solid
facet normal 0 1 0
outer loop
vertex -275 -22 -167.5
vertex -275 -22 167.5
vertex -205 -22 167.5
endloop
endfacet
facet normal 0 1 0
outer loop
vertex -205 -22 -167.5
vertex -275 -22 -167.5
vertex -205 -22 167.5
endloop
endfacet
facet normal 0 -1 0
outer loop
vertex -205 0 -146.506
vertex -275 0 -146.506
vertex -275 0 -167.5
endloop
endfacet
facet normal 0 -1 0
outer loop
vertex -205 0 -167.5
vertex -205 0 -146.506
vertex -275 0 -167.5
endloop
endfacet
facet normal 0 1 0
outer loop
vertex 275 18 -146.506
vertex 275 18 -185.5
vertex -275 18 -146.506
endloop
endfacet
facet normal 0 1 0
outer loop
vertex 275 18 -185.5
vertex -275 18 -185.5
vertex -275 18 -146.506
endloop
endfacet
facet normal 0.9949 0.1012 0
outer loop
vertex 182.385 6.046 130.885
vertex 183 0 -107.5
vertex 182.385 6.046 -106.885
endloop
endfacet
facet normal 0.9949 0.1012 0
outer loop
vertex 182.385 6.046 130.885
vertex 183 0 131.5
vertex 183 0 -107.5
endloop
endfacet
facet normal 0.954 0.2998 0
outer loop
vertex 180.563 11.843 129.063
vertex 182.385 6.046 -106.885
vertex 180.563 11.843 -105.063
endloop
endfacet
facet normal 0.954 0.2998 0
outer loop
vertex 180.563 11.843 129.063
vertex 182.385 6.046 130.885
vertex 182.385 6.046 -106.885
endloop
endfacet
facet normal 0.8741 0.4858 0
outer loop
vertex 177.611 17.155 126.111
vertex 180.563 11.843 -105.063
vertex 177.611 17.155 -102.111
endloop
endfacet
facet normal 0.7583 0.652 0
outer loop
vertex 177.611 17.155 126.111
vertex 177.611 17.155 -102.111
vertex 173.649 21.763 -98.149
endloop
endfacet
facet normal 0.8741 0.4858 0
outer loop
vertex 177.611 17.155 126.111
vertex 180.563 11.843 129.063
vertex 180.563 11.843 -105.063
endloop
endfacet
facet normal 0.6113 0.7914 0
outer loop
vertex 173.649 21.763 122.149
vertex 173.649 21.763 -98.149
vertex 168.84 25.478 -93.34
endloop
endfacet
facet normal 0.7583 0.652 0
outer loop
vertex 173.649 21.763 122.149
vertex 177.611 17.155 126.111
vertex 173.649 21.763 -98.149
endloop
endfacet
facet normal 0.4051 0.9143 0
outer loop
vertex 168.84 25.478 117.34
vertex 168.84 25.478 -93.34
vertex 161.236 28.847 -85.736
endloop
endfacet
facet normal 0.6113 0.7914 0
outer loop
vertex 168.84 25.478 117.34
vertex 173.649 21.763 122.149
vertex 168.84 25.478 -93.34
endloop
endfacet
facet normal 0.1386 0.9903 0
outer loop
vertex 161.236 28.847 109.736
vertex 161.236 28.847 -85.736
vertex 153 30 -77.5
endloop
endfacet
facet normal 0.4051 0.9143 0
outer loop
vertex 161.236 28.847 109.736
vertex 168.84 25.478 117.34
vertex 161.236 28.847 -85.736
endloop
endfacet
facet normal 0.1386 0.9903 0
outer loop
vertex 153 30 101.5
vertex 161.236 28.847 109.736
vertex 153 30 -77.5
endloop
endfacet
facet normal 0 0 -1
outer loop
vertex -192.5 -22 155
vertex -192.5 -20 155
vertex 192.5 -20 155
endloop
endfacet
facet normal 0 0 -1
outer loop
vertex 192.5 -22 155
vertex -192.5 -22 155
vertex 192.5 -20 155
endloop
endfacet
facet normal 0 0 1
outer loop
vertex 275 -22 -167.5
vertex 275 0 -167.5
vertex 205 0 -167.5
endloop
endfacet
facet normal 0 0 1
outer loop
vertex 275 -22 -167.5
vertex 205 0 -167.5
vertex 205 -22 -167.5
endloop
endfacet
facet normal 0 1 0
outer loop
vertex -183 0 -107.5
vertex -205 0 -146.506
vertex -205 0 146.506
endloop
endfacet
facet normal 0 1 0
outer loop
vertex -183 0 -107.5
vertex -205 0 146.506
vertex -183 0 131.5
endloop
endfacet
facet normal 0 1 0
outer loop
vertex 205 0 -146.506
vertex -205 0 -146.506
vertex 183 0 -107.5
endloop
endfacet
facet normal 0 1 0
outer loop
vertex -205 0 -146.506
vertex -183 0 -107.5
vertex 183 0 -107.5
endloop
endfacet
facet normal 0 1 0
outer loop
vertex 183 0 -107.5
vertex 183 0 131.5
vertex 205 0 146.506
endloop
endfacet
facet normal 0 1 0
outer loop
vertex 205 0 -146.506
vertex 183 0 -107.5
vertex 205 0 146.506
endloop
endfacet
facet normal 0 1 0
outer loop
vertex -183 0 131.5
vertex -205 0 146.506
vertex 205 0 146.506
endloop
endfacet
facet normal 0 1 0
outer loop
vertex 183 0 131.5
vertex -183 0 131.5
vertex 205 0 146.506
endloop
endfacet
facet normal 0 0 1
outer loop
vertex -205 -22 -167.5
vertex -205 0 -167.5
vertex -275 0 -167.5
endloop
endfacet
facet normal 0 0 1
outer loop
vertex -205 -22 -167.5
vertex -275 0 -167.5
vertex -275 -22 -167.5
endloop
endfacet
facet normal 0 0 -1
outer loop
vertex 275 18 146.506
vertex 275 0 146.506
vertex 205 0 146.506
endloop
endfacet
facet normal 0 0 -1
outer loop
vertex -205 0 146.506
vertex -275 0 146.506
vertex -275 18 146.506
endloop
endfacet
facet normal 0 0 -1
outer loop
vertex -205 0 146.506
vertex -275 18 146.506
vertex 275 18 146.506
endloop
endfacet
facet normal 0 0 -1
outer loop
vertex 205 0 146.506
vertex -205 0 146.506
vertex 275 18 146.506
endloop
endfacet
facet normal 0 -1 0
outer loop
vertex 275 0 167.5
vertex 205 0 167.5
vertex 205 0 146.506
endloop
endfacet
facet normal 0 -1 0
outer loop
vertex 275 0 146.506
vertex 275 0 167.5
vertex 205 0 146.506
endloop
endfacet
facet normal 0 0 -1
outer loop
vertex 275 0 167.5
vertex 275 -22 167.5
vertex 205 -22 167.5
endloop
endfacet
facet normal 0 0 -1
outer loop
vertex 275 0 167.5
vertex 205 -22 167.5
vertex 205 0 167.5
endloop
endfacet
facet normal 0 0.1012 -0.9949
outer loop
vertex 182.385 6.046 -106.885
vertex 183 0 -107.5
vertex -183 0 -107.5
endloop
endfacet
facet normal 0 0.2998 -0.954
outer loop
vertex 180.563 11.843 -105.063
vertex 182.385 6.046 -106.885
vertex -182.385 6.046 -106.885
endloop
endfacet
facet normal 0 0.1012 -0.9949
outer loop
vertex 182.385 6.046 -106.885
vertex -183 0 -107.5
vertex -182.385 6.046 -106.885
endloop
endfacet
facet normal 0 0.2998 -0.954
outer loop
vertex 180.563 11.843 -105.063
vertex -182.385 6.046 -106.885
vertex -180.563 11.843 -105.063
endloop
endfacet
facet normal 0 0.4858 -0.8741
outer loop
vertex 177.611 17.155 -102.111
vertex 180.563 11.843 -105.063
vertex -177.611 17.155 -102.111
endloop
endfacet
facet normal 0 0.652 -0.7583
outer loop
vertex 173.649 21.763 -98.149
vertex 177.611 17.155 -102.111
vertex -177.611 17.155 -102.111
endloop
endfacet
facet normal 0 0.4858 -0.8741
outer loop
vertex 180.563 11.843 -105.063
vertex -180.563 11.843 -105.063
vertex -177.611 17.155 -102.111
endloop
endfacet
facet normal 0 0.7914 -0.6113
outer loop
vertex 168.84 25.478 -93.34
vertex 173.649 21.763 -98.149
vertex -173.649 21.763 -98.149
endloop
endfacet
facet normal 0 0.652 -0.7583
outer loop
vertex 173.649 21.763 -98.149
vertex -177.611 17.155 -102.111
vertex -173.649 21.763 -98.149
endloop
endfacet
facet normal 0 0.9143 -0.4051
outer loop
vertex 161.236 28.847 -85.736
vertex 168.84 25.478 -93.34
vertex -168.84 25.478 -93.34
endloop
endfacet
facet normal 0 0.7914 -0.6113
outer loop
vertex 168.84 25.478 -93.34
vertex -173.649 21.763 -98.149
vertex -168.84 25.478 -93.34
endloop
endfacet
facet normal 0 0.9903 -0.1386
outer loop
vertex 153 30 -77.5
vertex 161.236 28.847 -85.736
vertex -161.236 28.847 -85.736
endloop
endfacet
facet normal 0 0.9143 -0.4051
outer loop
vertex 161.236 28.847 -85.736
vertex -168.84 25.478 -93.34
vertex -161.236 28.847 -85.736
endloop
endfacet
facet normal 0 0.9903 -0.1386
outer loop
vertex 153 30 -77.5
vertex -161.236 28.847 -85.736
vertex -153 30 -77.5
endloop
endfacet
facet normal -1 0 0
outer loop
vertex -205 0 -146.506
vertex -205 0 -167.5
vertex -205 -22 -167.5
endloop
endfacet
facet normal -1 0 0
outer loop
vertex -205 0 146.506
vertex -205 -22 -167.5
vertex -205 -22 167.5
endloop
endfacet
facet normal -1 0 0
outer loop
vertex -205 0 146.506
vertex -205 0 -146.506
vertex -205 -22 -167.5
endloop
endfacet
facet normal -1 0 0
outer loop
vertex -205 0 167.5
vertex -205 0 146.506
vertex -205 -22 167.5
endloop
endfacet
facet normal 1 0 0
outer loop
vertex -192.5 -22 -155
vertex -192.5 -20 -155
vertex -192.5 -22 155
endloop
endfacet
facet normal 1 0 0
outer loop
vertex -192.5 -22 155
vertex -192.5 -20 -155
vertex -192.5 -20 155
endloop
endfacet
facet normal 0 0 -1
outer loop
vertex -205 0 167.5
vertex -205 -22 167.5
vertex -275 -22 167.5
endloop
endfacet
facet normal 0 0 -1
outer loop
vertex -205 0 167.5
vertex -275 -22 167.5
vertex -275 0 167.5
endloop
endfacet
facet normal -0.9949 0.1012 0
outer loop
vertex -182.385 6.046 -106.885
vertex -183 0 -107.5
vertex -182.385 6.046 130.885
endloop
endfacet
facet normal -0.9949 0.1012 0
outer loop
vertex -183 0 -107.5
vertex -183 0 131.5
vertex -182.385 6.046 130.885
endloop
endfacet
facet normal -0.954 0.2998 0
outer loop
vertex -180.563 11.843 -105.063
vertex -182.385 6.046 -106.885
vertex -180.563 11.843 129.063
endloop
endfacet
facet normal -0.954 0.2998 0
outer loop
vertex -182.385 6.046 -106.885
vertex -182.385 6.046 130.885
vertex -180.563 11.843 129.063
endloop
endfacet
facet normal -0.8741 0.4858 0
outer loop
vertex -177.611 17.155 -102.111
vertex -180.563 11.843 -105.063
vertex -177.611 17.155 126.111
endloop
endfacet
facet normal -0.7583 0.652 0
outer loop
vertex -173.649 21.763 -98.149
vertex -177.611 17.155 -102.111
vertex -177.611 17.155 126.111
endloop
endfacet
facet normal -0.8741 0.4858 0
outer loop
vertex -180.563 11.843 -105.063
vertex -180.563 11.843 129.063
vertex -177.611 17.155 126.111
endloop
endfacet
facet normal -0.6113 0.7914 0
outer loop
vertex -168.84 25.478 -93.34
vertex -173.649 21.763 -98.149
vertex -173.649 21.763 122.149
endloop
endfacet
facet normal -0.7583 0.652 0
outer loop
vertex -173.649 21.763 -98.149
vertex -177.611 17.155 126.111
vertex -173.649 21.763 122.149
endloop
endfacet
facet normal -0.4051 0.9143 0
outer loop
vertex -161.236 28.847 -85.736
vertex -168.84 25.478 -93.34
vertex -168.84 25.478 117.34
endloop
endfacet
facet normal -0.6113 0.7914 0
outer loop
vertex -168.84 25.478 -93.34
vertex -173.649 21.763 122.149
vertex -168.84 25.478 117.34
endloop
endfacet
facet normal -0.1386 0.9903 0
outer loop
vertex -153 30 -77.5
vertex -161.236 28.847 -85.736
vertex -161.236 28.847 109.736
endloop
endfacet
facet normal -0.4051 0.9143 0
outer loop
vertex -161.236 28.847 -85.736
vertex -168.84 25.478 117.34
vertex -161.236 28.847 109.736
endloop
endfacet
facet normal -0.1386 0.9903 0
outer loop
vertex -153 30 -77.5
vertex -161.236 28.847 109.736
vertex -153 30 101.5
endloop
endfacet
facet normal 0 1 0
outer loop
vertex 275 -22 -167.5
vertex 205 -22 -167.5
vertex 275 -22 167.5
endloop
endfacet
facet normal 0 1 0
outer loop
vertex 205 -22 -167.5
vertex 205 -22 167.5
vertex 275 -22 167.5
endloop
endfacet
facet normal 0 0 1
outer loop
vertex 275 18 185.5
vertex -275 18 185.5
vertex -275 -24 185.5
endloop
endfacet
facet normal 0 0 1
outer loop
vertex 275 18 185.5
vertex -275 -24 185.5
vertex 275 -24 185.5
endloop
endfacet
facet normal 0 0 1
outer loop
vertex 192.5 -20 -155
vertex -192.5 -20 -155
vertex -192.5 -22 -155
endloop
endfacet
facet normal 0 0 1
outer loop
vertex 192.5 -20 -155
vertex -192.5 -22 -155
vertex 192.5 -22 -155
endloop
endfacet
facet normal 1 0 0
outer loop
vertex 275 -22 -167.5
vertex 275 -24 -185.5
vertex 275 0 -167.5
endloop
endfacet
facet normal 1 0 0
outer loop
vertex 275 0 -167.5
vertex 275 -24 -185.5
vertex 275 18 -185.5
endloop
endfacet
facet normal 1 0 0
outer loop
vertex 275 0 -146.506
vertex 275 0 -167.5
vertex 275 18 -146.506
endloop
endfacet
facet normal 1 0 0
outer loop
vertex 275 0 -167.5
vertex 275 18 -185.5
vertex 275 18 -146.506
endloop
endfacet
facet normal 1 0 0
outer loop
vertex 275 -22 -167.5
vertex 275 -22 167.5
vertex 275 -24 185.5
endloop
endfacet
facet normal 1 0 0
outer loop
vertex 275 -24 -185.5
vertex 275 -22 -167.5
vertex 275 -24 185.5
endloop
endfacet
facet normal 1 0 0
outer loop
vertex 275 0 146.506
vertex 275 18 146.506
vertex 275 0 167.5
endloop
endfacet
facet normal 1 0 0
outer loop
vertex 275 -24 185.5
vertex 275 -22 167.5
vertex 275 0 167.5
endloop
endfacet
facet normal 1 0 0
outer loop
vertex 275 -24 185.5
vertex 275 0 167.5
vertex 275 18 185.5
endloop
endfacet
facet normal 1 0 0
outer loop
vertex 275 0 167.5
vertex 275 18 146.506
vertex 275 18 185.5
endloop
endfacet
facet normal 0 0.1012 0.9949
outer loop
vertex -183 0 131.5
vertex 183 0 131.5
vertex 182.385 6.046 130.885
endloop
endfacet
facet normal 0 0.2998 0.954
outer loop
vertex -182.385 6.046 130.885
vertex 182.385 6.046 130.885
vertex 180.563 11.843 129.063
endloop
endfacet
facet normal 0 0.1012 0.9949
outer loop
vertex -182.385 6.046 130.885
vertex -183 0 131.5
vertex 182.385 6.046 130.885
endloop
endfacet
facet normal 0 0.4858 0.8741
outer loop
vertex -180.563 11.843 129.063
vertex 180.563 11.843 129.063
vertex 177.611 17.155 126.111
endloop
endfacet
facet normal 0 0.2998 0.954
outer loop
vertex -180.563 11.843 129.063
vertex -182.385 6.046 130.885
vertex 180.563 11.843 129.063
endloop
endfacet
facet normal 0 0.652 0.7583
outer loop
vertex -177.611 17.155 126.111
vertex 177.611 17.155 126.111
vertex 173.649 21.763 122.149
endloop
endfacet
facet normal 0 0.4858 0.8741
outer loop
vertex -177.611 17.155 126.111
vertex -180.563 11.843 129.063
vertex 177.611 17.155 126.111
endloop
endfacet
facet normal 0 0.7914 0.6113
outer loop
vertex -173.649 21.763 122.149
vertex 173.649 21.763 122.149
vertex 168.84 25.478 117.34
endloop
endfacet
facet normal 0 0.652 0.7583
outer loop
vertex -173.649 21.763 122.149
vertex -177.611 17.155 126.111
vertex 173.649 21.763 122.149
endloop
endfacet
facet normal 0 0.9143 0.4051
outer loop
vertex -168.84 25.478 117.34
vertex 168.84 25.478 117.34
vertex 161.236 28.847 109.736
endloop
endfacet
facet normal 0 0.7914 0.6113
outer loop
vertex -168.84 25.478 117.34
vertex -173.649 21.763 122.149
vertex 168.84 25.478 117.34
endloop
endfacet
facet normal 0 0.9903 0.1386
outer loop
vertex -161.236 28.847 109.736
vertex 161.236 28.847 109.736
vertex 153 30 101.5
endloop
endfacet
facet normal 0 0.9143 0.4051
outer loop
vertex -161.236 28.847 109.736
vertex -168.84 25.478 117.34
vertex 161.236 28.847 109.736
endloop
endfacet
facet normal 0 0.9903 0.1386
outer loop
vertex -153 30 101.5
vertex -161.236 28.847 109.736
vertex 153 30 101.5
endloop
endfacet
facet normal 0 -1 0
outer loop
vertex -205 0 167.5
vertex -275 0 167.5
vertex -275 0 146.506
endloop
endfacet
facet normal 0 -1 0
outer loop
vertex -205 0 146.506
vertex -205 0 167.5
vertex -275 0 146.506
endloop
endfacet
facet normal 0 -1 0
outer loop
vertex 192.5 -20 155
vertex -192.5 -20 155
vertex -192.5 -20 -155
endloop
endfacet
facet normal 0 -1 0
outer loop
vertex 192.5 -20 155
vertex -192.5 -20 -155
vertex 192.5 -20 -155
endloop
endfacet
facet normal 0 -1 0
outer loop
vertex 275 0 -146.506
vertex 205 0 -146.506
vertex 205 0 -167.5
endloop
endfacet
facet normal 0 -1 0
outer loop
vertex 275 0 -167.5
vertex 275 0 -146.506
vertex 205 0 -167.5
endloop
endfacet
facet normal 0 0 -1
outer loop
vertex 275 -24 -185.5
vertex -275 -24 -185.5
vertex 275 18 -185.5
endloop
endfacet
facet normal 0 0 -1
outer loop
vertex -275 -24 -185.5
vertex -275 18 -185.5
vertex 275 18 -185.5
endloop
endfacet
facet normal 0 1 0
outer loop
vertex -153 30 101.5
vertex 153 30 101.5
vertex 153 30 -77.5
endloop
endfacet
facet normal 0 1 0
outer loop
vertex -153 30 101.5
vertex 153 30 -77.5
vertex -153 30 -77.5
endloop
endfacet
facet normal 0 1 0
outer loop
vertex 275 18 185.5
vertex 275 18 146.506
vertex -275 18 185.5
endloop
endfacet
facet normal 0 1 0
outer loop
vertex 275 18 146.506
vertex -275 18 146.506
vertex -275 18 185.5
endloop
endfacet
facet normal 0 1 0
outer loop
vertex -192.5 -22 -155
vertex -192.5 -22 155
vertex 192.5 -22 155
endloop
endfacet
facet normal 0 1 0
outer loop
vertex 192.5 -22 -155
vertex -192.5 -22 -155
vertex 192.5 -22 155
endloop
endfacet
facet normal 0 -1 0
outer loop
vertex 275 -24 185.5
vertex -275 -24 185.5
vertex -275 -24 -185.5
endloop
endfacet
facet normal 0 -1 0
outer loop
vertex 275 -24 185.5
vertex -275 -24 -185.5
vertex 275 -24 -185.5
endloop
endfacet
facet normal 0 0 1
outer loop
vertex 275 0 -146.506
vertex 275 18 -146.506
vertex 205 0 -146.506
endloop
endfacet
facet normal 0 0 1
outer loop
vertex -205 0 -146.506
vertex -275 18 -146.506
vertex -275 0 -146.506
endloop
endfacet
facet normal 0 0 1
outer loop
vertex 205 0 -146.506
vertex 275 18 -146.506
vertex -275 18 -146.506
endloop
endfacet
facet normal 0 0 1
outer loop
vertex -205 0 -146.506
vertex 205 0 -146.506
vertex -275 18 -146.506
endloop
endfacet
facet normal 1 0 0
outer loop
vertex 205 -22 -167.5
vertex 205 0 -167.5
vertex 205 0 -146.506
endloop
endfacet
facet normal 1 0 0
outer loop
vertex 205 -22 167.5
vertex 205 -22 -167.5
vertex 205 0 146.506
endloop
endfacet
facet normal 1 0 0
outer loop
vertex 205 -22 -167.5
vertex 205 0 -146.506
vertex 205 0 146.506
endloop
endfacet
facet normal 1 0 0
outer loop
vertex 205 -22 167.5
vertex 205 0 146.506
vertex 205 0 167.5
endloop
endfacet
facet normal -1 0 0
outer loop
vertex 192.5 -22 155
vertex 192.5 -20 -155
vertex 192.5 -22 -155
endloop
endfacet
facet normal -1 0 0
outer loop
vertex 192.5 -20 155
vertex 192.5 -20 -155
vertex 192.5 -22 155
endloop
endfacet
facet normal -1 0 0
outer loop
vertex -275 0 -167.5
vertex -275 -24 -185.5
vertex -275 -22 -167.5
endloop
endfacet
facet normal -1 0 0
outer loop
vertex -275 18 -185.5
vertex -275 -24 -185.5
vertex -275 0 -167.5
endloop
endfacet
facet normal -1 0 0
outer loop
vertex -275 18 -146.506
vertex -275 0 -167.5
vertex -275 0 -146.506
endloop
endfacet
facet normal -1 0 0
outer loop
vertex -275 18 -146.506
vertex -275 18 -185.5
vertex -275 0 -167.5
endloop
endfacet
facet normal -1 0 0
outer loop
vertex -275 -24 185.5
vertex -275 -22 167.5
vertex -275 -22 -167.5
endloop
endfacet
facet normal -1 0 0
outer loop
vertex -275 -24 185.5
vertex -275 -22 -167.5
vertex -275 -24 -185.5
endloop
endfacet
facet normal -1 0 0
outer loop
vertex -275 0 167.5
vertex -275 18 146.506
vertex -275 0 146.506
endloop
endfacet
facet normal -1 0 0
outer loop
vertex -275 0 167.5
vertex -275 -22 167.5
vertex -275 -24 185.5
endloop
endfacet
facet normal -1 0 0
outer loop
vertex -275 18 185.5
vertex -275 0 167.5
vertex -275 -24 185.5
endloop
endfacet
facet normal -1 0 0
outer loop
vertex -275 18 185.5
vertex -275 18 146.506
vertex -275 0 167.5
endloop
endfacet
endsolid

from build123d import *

# Parameters (mm, degrees)
F0_W          = 410
F0_H          = 335
F0_W_2        = 385
F0_H_2        = 310
F1_DEPTH      = 22
F2_DEPTH      = 20
F4_DEPTH      = 480
F4_DEPTH_BACK = 70
F5_W          = 366
F5_H          = 239
F6_DEPTH      = 30
F7_R          = 29.99999
F9_W          = 550
F9_H          = 371
F10_DEPTH     = 2


# Not quite as in the source:
# - a fillet or chamfer is up to 0.001 mm smaller than in the source, because OpenCascade refuses the exact size


with BuildPart() as f1:
    # F0 (on Front) → F1 (new body)
    with BuildSketch(Plane.XZ):
        Rectangle(F0_W, F0_H)
        Rectangle(F0_W_2, F0_H_2, mode=Mode.SUBTRACT)
    extrude(amount=F1_DEPTH)

    # F0 (on Front) → F2 (join)
    with BuildSketch(Plane.XZ):
        Rectangle(F0_W_2, F0_H_2)
    extrude(amount=F2_DEPTH)

    # F5 (on face) → F6 (join)
    with BuildSketch(Plane(origin=(0, 0, 0), x_dir=(-1, 0, 0), z_dir=(0, 1, 0))):
        with Locations((0, 12)):
            Rectangle(F5_W, F5_H)
    extrude(amount=F6_DEPTH)

    # F7 (radius 30 in the source; OpenCascade refuses exactly that, so slightly less here)
    f7_edges = [f1.edges().sort_by_distance(p)[0] for p in [
        (-183, 30, 12),
        (0, 30, 131.5),
        (183, 30, 12),
        (0, 30, -107.5),
    ]]
    fillet(f7_edges, radius=F7_R)


with BuildPart() as f4:
    # F3 (on face) → F4 (new body, two sides)
    with BuildSketch(Plane.YZ.offset(205)) as f4_sk:
        Polygon((0, -167.5), (-22, -167.5), (-22, -185.5), (18, -185.5), (18, -146.5062479338), (0, -146.5062479338), align=None)
    extrude(amount=-F4_DEPTH)
    extrude(f4_sk.sketch, amount=F4_DEPTH_BACK)


with BuildPart() as f4b:
    # F3 (on face) → F4, piece 2 (new body, two sides)
    with BuildSketch(Plane.YZ.offset(205)) as f4_2_sk:
        Polygon((0, 146.5062479338), (18, 146.5062479338), (18, 185.5), (-22, 185.5), (-22, 167.5), (0, 167.5), align=None)
    extrude(amount=-F4_DEPTH)
    extrude(f4_2_sk.sketch, amount=F4_DEPTH_BACK)


with BuildPart() as f4_1:
    add(f4.part)

    # F8: union F4b, F1
    add(f4b.part)
    add(f1.part)

    # F9 (on face) → F10 (join)
    with BuildSketch(Plane.XZ.offset(22)):
        Rectangle(F9_W, F9_H)
    extrude(amount=F10_DEPTH)


solid = f4_1.part
